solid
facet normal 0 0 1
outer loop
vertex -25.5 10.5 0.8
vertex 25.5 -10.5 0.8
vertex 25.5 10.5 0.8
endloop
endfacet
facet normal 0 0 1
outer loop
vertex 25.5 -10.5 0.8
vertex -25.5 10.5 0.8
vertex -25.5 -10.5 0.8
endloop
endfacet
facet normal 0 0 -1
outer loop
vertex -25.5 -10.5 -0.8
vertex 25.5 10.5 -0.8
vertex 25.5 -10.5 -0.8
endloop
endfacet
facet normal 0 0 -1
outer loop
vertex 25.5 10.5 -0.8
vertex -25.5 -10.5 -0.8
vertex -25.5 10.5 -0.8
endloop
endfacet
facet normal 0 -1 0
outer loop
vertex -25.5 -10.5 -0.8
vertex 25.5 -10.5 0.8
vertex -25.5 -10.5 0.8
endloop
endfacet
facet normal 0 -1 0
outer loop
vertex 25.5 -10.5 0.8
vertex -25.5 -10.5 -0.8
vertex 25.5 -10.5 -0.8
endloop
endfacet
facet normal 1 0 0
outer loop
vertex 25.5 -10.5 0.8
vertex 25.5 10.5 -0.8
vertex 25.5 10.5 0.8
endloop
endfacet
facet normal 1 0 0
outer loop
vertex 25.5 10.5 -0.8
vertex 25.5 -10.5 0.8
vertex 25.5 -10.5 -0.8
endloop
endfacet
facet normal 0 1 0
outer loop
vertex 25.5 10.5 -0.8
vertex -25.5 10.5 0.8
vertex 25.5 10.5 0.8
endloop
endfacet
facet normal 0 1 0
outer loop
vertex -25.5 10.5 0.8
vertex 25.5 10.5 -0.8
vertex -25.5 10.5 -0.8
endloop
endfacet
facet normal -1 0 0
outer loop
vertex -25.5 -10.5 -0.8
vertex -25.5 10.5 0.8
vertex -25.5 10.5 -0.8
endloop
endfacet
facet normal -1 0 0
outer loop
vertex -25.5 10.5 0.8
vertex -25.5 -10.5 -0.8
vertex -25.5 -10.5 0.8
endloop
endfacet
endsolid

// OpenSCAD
$fn=64;

module sbc_board(length=51.0, width=21.0, thickness=1.6) {
    cube([length, width, thickness], center=true);
}

sbc_board();
